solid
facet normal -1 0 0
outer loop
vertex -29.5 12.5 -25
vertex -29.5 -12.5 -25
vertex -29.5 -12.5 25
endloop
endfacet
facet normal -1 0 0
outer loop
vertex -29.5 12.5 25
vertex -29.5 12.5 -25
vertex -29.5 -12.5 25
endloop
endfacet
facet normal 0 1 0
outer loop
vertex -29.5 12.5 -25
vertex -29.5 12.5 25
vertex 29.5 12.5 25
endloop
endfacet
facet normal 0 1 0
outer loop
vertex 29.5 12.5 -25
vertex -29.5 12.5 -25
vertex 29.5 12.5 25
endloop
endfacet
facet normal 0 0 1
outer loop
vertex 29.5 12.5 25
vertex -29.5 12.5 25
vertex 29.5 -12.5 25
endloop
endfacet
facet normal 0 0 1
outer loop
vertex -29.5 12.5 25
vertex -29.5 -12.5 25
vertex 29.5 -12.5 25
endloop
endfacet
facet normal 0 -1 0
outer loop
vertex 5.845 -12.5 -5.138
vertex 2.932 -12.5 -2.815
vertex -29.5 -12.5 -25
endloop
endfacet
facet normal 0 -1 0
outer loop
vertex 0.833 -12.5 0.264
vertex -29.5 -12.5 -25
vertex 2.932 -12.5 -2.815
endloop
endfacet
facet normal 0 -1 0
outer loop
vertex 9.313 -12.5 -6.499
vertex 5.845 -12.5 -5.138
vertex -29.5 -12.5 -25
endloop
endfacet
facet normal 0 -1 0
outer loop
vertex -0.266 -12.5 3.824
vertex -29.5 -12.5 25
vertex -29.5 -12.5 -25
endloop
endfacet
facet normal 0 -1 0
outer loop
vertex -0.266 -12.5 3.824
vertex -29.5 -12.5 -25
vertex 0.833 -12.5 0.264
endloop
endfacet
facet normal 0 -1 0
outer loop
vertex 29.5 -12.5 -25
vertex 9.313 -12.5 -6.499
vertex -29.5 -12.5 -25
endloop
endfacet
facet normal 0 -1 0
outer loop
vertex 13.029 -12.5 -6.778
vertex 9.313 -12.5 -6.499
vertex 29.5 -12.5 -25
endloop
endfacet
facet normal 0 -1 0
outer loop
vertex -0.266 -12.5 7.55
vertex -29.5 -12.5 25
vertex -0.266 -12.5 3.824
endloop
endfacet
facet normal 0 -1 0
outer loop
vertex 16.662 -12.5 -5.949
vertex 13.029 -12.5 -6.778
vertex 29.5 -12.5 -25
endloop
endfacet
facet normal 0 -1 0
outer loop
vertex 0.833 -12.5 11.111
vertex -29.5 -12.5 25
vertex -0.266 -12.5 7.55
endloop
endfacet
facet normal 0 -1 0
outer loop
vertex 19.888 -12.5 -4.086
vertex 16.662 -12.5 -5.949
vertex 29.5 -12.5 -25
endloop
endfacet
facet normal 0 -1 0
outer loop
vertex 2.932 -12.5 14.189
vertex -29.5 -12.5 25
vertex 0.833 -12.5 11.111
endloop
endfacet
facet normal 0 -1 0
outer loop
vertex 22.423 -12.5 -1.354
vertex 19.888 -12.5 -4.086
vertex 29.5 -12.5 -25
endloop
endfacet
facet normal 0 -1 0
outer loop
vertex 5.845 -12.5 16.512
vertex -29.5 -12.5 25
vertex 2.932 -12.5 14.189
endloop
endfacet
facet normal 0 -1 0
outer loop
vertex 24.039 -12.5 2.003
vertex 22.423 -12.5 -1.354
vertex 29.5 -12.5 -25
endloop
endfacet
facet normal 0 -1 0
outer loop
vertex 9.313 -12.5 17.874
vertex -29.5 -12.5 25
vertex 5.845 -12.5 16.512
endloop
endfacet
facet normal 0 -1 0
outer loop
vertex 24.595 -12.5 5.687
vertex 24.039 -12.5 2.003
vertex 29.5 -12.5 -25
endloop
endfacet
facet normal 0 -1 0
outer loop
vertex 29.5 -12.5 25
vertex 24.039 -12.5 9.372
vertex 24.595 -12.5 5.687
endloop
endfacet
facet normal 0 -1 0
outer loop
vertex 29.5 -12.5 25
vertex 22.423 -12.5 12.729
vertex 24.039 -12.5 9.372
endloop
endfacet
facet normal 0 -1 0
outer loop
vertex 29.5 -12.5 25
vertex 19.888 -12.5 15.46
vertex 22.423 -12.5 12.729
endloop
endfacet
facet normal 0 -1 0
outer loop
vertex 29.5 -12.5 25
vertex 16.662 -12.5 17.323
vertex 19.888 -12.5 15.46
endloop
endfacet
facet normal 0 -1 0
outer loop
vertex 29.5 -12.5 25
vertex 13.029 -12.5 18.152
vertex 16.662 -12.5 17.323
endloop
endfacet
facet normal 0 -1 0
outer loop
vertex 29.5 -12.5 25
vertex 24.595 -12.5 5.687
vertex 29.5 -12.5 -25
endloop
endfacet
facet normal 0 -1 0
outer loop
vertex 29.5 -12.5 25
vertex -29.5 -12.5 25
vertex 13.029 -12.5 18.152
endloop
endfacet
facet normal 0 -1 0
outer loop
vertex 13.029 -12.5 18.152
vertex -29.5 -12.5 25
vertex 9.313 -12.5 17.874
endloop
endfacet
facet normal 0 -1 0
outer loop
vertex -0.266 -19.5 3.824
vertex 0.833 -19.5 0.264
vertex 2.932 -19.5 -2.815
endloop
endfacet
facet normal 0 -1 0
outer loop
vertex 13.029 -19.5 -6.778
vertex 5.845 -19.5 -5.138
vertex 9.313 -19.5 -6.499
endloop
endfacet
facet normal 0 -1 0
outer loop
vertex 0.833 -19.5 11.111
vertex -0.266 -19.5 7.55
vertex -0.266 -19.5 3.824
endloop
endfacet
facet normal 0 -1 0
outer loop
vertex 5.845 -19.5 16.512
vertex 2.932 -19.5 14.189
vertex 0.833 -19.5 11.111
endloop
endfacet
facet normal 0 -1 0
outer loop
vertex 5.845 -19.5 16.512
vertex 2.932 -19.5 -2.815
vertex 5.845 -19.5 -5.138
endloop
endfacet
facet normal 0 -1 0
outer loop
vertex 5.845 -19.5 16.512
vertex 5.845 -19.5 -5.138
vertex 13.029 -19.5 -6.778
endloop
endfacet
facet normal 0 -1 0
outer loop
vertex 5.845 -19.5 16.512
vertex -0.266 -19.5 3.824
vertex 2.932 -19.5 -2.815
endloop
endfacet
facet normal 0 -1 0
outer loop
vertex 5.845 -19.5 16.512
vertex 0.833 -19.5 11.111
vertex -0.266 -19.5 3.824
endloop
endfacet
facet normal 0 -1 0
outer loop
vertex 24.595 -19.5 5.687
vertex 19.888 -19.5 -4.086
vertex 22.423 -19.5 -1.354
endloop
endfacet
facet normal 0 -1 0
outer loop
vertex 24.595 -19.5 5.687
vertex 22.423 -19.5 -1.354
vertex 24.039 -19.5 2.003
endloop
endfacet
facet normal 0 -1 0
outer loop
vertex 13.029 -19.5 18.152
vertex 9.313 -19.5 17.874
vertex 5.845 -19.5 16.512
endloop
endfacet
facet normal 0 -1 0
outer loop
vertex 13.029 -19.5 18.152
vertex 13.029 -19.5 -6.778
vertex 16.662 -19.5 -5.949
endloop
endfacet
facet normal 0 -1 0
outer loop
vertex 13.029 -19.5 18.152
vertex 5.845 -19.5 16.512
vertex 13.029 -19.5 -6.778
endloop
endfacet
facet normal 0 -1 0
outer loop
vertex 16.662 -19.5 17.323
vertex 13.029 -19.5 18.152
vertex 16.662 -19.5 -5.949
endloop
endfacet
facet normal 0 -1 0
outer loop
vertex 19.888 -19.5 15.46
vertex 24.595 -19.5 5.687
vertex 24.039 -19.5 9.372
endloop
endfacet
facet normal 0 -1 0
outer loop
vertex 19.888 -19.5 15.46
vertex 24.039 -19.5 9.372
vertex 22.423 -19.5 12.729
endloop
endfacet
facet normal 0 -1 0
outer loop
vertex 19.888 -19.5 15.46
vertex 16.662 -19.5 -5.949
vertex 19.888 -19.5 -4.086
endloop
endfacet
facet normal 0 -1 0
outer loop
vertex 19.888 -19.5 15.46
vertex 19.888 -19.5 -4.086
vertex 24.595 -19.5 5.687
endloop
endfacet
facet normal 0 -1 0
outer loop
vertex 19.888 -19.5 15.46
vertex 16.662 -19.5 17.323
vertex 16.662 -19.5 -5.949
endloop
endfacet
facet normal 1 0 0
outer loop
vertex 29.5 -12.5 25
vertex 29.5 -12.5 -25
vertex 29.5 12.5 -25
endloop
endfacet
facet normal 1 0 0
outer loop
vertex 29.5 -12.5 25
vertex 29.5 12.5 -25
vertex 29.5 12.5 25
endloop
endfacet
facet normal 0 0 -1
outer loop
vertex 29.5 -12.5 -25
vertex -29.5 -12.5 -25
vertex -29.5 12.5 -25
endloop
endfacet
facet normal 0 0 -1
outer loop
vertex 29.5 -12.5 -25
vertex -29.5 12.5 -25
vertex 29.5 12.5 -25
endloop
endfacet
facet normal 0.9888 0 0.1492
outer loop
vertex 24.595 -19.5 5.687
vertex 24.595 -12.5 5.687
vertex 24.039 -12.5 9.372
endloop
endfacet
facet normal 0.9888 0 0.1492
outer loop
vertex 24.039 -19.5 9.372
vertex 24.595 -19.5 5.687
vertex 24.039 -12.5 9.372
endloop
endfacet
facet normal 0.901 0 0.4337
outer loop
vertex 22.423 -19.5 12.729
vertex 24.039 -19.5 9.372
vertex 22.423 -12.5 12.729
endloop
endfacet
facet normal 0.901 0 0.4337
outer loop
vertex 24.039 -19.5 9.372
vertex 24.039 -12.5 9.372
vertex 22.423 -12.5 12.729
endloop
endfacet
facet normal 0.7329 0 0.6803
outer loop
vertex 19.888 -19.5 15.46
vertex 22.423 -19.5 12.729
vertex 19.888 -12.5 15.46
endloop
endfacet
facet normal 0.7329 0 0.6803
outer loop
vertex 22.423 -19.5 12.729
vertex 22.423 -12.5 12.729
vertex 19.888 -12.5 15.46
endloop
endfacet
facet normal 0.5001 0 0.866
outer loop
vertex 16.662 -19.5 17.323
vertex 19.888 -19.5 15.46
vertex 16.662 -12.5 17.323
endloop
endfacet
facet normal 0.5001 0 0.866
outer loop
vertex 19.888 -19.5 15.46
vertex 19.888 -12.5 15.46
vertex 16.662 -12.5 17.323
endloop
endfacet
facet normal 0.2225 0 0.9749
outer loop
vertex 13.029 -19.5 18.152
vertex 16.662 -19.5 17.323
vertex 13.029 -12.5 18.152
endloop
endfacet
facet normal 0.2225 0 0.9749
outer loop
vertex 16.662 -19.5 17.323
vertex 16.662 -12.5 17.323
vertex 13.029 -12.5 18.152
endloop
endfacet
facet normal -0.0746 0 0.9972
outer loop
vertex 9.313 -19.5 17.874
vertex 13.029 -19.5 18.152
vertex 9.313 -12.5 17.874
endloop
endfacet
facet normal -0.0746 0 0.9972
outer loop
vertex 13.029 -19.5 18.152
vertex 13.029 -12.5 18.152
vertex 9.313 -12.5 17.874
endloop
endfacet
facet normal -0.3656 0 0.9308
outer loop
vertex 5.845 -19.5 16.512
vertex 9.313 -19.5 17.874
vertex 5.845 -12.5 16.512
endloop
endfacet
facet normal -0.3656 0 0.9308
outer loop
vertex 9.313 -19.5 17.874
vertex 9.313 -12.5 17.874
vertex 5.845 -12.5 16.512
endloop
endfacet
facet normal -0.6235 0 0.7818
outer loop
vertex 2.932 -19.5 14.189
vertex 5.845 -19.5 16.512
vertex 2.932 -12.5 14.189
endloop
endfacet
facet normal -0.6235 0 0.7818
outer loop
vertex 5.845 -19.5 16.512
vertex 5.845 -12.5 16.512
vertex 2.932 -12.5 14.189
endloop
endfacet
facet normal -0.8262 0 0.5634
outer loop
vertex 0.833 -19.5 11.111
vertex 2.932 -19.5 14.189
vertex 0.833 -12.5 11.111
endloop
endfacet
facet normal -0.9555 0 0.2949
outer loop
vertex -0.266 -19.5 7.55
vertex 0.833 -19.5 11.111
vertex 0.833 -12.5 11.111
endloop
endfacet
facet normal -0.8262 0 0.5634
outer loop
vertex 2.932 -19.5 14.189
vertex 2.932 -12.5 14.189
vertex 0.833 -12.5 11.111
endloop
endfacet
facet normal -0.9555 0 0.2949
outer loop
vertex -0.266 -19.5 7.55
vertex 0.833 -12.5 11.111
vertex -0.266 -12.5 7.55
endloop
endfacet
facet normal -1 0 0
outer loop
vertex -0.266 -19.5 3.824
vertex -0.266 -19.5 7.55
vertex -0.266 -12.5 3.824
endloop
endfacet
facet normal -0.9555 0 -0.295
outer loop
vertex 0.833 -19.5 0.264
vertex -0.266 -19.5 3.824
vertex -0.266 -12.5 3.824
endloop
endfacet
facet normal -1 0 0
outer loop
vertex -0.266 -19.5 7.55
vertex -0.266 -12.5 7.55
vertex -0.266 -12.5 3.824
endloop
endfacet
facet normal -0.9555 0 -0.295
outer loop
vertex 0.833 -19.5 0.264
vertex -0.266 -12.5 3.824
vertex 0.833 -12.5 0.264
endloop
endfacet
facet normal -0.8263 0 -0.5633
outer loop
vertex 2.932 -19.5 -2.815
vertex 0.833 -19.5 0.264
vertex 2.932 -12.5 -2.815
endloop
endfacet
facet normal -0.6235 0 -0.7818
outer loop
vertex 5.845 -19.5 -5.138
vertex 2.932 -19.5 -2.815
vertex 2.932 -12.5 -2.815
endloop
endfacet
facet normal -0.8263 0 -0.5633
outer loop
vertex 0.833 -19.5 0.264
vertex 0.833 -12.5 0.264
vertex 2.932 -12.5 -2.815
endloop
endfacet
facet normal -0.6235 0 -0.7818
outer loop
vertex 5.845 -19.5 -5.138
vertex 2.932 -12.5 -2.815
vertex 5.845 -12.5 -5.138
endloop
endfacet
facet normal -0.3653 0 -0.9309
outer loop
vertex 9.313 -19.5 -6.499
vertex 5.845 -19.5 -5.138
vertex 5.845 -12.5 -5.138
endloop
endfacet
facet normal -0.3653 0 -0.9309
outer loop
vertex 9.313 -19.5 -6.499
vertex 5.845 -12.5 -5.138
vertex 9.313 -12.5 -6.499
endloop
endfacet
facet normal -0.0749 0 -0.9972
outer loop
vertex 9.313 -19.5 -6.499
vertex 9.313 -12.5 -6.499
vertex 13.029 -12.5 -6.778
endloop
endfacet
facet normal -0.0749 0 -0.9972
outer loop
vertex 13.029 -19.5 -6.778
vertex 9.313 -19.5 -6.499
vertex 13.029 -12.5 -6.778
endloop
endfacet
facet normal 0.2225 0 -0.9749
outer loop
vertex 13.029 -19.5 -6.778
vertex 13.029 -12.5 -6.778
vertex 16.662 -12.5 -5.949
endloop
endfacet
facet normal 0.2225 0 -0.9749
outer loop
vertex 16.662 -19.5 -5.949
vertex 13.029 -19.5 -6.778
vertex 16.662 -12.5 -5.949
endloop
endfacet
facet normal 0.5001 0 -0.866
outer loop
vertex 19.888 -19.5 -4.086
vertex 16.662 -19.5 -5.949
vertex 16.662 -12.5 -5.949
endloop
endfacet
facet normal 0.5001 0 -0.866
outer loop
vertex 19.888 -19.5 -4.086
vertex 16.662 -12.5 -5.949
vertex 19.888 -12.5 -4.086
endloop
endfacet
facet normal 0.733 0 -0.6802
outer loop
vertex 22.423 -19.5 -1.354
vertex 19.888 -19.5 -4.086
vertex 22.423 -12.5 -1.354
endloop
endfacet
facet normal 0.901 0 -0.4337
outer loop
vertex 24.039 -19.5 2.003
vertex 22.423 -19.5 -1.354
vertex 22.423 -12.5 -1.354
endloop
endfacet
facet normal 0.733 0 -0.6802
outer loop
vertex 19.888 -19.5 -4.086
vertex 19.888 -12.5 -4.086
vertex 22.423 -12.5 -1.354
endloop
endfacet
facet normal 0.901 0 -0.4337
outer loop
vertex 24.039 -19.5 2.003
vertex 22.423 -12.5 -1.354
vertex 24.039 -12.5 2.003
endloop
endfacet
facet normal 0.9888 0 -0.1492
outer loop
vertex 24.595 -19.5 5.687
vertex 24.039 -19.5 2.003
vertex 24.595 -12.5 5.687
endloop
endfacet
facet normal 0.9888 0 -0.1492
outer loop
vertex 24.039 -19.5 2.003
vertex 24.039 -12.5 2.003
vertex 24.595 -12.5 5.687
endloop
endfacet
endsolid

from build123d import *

# Parameters (mm, degrees)
F0_W     = 59
F0_H     = 50
F1_DEPTH = 12.5
F3_R     = 12.5
F4_DEPTH = 7


with BuildPart() as f1:
    # F0 (on Front) → F1 (new body, symmetric)
    with BuildSketch(Plane.XZ):
        Rectangle(F0_W, F0_H)
    extrude(amount=F1_DEPTH, both=True)

    # F3 (on face) → F4 (join)
    with BuildSketch(Plane.XZ.offset(12.5)):
        with Locations((12.0948115364, 5.6871213019)):
            Circle(F3_R)
    extrude(amount=F4_DEPTH)


solid = f1.part
